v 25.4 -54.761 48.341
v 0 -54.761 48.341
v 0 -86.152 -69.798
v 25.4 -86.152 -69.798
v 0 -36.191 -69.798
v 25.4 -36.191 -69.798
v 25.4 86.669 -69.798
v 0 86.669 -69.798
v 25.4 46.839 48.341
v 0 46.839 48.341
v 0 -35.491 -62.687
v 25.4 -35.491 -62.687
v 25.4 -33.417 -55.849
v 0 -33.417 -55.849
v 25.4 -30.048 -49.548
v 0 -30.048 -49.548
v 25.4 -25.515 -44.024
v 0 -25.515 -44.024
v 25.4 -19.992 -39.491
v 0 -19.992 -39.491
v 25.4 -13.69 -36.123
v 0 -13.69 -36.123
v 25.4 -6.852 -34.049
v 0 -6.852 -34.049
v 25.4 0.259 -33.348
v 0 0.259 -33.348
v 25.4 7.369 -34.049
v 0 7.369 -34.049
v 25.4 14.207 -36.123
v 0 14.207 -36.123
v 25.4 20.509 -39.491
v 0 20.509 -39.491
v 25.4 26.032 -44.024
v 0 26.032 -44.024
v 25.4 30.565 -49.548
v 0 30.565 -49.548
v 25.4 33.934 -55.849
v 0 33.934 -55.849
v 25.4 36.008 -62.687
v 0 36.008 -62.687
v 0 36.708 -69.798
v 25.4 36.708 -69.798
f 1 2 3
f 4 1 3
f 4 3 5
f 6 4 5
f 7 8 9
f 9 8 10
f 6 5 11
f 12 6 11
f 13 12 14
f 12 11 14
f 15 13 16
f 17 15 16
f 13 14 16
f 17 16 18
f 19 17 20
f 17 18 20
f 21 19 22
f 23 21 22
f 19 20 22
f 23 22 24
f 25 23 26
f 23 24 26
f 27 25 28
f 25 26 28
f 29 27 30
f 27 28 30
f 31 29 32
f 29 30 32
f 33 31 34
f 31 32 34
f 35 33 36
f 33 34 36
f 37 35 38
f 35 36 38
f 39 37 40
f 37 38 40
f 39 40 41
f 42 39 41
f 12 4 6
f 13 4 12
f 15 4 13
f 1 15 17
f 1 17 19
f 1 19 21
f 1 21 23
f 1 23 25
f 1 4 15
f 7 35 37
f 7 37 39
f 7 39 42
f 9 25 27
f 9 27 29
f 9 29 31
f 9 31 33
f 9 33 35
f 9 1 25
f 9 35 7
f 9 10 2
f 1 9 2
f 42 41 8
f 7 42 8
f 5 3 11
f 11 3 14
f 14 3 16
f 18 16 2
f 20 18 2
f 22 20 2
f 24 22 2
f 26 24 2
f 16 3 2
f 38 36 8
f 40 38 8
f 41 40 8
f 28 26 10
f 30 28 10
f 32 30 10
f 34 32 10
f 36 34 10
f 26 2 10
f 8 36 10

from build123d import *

# Parameters (mm, degrees)
F1_DEPTH = 25.4


with BuildPart() as f1:
    # F0 (on Right) → F1 (new body)
    with BuildSketch(Plane.YZ):
        with BuildLine():
            Line((46.839244, 48.341449), (-54.760756, 48.341449))
            Line((-54.760756, 48.341449), (-86.152115, -69.798089))
            Line((-86.152115, -69.798089), (-36.191094, -69.798089))
            ThreePointArc((-36.191094, -69.798089), (0.258513, -33.348482), (36.70812, -69.798089))
            Line((36.70812, -69.798089), (86.669141, -69.798089))
            Line((86.669141, -69.798089), (46.839244, 48.341449))
        make_face()
    extrude(amount=F1_DEPTH)


solid = f1.part
